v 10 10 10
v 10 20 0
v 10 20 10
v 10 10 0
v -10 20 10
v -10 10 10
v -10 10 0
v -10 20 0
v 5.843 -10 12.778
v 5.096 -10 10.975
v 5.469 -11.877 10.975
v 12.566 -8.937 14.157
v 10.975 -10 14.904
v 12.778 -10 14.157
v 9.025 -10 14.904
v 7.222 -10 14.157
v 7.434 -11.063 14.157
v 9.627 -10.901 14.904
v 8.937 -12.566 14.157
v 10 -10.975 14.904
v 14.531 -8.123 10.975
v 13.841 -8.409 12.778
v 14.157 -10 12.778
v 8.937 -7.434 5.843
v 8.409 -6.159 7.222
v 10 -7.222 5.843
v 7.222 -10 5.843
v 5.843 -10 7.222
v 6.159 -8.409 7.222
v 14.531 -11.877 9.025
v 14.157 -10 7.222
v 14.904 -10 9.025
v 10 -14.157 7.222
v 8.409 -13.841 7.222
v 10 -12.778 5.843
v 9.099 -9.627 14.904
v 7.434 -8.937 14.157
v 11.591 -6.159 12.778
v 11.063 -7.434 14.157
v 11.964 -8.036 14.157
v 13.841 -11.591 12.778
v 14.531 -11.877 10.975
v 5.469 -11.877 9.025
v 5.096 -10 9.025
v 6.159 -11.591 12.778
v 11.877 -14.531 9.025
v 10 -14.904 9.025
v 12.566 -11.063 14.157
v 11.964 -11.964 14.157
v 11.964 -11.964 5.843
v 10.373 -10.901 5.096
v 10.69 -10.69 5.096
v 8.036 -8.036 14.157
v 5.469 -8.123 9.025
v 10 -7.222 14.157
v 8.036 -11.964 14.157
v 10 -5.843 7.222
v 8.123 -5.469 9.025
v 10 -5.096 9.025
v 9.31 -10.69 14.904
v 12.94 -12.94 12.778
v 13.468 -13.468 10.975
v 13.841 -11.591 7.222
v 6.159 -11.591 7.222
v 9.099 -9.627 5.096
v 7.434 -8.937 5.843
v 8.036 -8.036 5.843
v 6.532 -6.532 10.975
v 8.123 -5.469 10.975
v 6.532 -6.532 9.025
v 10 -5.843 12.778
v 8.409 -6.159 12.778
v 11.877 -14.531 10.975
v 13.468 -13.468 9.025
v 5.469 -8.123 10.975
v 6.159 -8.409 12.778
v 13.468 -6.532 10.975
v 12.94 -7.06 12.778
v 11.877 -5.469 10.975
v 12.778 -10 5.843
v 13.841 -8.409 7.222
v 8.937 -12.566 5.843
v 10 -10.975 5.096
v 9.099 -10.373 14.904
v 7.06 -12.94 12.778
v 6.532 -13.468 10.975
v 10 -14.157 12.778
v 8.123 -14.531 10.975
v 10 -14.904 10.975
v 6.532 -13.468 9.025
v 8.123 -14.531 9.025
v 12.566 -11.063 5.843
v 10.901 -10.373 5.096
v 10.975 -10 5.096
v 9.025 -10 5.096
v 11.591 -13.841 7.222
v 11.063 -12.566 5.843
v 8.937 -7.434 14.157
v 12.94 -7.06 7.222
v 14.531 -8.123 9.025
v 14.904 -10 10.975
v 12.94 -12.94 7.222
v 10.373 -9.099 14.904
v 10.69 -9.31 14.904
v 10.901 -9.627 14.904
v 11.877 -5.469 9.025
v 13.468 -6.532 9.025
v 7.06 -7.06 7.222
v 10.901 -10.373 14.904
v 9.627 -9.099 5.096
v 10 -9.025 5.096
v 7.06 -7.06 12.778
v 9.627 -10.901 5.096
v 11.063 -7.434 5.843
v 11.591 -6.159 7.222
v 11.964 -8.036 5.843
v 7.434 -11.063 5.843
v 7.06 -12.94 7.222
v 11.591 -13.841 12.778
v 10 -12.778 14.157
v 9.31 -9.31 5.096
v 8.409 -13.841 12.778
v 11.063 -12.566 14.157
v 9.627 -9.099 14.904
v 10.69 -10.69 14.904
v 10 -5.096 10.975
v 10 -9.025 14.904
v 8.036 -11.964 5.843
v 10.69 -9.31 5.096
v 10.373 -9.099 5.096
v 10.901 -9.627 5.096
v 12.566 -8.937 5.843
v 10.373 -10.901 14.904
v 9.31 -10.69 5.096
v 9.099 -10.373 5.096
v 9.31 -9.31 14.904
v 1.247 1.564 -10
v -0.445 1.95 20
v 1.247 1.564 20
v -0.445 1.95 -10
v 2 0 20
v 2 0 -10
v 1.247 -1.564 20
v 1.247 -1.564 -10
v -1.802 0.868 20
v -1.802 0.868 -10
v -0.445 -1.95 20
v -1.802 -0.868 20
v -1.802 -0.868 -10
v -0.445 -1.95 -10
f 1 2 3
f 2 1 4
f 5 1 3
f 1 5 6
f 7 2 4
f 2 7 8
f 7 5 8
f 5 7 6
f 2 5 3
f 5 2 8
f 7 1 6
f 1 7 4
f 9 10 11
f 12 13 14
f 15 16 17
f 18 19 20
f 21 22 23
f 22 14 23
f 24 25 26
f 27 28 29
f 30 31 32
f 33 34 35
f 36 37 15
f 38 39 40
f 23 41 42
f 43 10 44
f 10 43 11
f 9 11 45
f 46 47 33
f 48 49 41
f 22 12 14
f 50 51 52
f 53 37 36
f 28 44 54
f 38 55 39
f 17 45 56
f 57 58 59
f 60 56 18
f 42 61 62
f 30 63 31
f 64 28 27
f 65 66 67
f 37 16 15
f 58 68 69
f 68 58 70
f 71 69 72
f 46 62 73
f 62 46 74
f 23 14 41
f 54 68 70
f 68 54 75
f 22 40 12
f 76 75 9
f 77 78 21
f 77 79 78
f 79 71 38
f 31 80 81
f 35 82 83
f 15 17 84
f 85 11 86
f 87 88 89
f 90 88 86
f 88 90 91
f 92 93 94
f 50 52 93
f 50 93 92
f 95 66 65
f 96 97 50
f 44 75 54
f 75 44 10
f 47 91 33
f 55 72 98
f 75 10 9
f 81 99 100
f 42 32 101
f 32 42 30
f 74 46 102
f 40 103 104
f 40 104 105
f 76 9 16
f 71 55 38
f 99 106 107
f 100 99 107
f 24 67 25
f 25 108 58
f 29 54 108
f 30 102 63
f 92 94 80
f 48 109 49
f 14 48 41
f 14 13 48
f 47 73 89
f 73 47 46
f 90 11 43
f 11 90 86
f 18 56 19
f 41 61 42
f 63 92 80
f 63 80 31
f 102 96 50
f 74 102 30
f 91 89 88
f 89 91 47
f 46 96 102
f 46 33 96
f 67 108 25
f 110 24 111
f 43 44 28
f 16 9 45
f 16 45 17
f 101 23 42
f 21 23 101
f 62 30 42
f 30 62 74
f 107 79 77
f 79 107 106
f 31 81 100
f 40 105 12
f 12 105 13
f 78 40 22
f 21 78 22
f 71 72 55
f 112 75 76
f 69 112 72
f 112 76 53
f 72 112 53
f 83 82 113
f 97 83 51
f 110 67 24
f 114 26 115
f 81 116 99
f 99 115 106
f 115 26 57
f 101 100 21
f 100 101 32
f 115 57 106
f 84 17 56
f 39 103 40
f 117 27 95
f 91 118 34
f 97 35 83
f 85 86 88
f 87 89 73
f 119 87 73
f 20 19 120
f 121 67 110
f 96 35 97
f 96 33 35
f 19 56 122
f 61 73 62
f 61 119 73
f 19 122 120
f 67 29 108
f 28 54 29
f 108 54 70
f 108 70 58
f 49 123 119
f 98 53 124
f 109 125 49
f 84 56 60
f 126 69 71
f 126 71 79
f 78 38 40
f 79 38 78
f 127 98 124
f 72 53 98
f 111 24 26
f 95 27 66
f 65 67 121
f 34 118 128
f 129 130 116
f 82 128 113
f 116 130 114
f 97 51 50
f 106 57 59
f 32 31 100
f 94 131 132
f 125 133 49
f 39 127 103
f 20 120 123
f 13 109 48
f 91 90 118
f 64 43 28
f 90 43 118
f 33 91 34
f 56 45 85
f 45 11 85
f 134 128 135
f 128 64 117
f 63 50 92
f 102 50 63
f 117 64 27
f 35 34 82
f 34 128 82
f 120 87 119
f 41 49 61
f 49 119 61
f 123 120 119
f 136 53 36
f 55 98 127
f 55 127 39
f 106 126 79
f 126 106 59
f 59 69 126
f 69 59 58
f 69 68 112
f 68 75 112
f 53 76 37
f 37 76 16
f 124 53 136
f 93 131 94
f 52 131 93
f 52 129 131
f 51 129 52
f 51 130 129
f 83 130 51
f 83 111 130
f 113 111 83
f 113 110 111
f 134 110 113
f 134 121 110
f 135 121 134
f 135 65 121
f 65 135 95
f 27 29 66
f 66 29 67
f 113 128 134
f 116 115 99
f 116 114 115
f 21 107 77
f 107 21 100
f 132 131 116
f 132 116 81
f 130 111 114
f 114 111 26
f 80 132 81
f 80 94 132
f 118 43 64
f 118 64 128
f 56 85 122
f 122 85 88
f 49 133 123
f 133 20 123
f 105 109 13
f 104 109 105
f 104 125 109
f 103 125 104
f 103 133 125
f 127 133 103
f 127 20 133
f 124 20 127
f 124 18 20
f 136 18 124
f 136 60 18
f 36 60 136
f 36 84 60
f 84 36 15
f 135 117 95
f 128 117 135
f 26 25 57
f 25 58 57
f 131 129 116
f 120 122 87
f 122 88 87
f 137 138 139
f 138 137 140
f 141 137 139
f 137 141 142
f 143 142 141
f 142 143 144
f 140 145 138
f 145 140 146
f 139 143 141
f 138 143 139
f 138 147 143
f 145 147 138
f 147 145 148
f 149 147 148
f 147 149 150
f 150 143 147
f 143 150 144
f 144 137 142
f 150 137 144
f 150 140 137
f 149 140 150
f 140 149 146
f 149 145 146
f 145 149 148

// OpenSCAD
translate([-10, 10, 0]) cube([20, 10, 10]); 
translate([10, -10, 10]) sphere(5); 
translate([0, 0, -10]) cylinder(h=30, r=2); 
